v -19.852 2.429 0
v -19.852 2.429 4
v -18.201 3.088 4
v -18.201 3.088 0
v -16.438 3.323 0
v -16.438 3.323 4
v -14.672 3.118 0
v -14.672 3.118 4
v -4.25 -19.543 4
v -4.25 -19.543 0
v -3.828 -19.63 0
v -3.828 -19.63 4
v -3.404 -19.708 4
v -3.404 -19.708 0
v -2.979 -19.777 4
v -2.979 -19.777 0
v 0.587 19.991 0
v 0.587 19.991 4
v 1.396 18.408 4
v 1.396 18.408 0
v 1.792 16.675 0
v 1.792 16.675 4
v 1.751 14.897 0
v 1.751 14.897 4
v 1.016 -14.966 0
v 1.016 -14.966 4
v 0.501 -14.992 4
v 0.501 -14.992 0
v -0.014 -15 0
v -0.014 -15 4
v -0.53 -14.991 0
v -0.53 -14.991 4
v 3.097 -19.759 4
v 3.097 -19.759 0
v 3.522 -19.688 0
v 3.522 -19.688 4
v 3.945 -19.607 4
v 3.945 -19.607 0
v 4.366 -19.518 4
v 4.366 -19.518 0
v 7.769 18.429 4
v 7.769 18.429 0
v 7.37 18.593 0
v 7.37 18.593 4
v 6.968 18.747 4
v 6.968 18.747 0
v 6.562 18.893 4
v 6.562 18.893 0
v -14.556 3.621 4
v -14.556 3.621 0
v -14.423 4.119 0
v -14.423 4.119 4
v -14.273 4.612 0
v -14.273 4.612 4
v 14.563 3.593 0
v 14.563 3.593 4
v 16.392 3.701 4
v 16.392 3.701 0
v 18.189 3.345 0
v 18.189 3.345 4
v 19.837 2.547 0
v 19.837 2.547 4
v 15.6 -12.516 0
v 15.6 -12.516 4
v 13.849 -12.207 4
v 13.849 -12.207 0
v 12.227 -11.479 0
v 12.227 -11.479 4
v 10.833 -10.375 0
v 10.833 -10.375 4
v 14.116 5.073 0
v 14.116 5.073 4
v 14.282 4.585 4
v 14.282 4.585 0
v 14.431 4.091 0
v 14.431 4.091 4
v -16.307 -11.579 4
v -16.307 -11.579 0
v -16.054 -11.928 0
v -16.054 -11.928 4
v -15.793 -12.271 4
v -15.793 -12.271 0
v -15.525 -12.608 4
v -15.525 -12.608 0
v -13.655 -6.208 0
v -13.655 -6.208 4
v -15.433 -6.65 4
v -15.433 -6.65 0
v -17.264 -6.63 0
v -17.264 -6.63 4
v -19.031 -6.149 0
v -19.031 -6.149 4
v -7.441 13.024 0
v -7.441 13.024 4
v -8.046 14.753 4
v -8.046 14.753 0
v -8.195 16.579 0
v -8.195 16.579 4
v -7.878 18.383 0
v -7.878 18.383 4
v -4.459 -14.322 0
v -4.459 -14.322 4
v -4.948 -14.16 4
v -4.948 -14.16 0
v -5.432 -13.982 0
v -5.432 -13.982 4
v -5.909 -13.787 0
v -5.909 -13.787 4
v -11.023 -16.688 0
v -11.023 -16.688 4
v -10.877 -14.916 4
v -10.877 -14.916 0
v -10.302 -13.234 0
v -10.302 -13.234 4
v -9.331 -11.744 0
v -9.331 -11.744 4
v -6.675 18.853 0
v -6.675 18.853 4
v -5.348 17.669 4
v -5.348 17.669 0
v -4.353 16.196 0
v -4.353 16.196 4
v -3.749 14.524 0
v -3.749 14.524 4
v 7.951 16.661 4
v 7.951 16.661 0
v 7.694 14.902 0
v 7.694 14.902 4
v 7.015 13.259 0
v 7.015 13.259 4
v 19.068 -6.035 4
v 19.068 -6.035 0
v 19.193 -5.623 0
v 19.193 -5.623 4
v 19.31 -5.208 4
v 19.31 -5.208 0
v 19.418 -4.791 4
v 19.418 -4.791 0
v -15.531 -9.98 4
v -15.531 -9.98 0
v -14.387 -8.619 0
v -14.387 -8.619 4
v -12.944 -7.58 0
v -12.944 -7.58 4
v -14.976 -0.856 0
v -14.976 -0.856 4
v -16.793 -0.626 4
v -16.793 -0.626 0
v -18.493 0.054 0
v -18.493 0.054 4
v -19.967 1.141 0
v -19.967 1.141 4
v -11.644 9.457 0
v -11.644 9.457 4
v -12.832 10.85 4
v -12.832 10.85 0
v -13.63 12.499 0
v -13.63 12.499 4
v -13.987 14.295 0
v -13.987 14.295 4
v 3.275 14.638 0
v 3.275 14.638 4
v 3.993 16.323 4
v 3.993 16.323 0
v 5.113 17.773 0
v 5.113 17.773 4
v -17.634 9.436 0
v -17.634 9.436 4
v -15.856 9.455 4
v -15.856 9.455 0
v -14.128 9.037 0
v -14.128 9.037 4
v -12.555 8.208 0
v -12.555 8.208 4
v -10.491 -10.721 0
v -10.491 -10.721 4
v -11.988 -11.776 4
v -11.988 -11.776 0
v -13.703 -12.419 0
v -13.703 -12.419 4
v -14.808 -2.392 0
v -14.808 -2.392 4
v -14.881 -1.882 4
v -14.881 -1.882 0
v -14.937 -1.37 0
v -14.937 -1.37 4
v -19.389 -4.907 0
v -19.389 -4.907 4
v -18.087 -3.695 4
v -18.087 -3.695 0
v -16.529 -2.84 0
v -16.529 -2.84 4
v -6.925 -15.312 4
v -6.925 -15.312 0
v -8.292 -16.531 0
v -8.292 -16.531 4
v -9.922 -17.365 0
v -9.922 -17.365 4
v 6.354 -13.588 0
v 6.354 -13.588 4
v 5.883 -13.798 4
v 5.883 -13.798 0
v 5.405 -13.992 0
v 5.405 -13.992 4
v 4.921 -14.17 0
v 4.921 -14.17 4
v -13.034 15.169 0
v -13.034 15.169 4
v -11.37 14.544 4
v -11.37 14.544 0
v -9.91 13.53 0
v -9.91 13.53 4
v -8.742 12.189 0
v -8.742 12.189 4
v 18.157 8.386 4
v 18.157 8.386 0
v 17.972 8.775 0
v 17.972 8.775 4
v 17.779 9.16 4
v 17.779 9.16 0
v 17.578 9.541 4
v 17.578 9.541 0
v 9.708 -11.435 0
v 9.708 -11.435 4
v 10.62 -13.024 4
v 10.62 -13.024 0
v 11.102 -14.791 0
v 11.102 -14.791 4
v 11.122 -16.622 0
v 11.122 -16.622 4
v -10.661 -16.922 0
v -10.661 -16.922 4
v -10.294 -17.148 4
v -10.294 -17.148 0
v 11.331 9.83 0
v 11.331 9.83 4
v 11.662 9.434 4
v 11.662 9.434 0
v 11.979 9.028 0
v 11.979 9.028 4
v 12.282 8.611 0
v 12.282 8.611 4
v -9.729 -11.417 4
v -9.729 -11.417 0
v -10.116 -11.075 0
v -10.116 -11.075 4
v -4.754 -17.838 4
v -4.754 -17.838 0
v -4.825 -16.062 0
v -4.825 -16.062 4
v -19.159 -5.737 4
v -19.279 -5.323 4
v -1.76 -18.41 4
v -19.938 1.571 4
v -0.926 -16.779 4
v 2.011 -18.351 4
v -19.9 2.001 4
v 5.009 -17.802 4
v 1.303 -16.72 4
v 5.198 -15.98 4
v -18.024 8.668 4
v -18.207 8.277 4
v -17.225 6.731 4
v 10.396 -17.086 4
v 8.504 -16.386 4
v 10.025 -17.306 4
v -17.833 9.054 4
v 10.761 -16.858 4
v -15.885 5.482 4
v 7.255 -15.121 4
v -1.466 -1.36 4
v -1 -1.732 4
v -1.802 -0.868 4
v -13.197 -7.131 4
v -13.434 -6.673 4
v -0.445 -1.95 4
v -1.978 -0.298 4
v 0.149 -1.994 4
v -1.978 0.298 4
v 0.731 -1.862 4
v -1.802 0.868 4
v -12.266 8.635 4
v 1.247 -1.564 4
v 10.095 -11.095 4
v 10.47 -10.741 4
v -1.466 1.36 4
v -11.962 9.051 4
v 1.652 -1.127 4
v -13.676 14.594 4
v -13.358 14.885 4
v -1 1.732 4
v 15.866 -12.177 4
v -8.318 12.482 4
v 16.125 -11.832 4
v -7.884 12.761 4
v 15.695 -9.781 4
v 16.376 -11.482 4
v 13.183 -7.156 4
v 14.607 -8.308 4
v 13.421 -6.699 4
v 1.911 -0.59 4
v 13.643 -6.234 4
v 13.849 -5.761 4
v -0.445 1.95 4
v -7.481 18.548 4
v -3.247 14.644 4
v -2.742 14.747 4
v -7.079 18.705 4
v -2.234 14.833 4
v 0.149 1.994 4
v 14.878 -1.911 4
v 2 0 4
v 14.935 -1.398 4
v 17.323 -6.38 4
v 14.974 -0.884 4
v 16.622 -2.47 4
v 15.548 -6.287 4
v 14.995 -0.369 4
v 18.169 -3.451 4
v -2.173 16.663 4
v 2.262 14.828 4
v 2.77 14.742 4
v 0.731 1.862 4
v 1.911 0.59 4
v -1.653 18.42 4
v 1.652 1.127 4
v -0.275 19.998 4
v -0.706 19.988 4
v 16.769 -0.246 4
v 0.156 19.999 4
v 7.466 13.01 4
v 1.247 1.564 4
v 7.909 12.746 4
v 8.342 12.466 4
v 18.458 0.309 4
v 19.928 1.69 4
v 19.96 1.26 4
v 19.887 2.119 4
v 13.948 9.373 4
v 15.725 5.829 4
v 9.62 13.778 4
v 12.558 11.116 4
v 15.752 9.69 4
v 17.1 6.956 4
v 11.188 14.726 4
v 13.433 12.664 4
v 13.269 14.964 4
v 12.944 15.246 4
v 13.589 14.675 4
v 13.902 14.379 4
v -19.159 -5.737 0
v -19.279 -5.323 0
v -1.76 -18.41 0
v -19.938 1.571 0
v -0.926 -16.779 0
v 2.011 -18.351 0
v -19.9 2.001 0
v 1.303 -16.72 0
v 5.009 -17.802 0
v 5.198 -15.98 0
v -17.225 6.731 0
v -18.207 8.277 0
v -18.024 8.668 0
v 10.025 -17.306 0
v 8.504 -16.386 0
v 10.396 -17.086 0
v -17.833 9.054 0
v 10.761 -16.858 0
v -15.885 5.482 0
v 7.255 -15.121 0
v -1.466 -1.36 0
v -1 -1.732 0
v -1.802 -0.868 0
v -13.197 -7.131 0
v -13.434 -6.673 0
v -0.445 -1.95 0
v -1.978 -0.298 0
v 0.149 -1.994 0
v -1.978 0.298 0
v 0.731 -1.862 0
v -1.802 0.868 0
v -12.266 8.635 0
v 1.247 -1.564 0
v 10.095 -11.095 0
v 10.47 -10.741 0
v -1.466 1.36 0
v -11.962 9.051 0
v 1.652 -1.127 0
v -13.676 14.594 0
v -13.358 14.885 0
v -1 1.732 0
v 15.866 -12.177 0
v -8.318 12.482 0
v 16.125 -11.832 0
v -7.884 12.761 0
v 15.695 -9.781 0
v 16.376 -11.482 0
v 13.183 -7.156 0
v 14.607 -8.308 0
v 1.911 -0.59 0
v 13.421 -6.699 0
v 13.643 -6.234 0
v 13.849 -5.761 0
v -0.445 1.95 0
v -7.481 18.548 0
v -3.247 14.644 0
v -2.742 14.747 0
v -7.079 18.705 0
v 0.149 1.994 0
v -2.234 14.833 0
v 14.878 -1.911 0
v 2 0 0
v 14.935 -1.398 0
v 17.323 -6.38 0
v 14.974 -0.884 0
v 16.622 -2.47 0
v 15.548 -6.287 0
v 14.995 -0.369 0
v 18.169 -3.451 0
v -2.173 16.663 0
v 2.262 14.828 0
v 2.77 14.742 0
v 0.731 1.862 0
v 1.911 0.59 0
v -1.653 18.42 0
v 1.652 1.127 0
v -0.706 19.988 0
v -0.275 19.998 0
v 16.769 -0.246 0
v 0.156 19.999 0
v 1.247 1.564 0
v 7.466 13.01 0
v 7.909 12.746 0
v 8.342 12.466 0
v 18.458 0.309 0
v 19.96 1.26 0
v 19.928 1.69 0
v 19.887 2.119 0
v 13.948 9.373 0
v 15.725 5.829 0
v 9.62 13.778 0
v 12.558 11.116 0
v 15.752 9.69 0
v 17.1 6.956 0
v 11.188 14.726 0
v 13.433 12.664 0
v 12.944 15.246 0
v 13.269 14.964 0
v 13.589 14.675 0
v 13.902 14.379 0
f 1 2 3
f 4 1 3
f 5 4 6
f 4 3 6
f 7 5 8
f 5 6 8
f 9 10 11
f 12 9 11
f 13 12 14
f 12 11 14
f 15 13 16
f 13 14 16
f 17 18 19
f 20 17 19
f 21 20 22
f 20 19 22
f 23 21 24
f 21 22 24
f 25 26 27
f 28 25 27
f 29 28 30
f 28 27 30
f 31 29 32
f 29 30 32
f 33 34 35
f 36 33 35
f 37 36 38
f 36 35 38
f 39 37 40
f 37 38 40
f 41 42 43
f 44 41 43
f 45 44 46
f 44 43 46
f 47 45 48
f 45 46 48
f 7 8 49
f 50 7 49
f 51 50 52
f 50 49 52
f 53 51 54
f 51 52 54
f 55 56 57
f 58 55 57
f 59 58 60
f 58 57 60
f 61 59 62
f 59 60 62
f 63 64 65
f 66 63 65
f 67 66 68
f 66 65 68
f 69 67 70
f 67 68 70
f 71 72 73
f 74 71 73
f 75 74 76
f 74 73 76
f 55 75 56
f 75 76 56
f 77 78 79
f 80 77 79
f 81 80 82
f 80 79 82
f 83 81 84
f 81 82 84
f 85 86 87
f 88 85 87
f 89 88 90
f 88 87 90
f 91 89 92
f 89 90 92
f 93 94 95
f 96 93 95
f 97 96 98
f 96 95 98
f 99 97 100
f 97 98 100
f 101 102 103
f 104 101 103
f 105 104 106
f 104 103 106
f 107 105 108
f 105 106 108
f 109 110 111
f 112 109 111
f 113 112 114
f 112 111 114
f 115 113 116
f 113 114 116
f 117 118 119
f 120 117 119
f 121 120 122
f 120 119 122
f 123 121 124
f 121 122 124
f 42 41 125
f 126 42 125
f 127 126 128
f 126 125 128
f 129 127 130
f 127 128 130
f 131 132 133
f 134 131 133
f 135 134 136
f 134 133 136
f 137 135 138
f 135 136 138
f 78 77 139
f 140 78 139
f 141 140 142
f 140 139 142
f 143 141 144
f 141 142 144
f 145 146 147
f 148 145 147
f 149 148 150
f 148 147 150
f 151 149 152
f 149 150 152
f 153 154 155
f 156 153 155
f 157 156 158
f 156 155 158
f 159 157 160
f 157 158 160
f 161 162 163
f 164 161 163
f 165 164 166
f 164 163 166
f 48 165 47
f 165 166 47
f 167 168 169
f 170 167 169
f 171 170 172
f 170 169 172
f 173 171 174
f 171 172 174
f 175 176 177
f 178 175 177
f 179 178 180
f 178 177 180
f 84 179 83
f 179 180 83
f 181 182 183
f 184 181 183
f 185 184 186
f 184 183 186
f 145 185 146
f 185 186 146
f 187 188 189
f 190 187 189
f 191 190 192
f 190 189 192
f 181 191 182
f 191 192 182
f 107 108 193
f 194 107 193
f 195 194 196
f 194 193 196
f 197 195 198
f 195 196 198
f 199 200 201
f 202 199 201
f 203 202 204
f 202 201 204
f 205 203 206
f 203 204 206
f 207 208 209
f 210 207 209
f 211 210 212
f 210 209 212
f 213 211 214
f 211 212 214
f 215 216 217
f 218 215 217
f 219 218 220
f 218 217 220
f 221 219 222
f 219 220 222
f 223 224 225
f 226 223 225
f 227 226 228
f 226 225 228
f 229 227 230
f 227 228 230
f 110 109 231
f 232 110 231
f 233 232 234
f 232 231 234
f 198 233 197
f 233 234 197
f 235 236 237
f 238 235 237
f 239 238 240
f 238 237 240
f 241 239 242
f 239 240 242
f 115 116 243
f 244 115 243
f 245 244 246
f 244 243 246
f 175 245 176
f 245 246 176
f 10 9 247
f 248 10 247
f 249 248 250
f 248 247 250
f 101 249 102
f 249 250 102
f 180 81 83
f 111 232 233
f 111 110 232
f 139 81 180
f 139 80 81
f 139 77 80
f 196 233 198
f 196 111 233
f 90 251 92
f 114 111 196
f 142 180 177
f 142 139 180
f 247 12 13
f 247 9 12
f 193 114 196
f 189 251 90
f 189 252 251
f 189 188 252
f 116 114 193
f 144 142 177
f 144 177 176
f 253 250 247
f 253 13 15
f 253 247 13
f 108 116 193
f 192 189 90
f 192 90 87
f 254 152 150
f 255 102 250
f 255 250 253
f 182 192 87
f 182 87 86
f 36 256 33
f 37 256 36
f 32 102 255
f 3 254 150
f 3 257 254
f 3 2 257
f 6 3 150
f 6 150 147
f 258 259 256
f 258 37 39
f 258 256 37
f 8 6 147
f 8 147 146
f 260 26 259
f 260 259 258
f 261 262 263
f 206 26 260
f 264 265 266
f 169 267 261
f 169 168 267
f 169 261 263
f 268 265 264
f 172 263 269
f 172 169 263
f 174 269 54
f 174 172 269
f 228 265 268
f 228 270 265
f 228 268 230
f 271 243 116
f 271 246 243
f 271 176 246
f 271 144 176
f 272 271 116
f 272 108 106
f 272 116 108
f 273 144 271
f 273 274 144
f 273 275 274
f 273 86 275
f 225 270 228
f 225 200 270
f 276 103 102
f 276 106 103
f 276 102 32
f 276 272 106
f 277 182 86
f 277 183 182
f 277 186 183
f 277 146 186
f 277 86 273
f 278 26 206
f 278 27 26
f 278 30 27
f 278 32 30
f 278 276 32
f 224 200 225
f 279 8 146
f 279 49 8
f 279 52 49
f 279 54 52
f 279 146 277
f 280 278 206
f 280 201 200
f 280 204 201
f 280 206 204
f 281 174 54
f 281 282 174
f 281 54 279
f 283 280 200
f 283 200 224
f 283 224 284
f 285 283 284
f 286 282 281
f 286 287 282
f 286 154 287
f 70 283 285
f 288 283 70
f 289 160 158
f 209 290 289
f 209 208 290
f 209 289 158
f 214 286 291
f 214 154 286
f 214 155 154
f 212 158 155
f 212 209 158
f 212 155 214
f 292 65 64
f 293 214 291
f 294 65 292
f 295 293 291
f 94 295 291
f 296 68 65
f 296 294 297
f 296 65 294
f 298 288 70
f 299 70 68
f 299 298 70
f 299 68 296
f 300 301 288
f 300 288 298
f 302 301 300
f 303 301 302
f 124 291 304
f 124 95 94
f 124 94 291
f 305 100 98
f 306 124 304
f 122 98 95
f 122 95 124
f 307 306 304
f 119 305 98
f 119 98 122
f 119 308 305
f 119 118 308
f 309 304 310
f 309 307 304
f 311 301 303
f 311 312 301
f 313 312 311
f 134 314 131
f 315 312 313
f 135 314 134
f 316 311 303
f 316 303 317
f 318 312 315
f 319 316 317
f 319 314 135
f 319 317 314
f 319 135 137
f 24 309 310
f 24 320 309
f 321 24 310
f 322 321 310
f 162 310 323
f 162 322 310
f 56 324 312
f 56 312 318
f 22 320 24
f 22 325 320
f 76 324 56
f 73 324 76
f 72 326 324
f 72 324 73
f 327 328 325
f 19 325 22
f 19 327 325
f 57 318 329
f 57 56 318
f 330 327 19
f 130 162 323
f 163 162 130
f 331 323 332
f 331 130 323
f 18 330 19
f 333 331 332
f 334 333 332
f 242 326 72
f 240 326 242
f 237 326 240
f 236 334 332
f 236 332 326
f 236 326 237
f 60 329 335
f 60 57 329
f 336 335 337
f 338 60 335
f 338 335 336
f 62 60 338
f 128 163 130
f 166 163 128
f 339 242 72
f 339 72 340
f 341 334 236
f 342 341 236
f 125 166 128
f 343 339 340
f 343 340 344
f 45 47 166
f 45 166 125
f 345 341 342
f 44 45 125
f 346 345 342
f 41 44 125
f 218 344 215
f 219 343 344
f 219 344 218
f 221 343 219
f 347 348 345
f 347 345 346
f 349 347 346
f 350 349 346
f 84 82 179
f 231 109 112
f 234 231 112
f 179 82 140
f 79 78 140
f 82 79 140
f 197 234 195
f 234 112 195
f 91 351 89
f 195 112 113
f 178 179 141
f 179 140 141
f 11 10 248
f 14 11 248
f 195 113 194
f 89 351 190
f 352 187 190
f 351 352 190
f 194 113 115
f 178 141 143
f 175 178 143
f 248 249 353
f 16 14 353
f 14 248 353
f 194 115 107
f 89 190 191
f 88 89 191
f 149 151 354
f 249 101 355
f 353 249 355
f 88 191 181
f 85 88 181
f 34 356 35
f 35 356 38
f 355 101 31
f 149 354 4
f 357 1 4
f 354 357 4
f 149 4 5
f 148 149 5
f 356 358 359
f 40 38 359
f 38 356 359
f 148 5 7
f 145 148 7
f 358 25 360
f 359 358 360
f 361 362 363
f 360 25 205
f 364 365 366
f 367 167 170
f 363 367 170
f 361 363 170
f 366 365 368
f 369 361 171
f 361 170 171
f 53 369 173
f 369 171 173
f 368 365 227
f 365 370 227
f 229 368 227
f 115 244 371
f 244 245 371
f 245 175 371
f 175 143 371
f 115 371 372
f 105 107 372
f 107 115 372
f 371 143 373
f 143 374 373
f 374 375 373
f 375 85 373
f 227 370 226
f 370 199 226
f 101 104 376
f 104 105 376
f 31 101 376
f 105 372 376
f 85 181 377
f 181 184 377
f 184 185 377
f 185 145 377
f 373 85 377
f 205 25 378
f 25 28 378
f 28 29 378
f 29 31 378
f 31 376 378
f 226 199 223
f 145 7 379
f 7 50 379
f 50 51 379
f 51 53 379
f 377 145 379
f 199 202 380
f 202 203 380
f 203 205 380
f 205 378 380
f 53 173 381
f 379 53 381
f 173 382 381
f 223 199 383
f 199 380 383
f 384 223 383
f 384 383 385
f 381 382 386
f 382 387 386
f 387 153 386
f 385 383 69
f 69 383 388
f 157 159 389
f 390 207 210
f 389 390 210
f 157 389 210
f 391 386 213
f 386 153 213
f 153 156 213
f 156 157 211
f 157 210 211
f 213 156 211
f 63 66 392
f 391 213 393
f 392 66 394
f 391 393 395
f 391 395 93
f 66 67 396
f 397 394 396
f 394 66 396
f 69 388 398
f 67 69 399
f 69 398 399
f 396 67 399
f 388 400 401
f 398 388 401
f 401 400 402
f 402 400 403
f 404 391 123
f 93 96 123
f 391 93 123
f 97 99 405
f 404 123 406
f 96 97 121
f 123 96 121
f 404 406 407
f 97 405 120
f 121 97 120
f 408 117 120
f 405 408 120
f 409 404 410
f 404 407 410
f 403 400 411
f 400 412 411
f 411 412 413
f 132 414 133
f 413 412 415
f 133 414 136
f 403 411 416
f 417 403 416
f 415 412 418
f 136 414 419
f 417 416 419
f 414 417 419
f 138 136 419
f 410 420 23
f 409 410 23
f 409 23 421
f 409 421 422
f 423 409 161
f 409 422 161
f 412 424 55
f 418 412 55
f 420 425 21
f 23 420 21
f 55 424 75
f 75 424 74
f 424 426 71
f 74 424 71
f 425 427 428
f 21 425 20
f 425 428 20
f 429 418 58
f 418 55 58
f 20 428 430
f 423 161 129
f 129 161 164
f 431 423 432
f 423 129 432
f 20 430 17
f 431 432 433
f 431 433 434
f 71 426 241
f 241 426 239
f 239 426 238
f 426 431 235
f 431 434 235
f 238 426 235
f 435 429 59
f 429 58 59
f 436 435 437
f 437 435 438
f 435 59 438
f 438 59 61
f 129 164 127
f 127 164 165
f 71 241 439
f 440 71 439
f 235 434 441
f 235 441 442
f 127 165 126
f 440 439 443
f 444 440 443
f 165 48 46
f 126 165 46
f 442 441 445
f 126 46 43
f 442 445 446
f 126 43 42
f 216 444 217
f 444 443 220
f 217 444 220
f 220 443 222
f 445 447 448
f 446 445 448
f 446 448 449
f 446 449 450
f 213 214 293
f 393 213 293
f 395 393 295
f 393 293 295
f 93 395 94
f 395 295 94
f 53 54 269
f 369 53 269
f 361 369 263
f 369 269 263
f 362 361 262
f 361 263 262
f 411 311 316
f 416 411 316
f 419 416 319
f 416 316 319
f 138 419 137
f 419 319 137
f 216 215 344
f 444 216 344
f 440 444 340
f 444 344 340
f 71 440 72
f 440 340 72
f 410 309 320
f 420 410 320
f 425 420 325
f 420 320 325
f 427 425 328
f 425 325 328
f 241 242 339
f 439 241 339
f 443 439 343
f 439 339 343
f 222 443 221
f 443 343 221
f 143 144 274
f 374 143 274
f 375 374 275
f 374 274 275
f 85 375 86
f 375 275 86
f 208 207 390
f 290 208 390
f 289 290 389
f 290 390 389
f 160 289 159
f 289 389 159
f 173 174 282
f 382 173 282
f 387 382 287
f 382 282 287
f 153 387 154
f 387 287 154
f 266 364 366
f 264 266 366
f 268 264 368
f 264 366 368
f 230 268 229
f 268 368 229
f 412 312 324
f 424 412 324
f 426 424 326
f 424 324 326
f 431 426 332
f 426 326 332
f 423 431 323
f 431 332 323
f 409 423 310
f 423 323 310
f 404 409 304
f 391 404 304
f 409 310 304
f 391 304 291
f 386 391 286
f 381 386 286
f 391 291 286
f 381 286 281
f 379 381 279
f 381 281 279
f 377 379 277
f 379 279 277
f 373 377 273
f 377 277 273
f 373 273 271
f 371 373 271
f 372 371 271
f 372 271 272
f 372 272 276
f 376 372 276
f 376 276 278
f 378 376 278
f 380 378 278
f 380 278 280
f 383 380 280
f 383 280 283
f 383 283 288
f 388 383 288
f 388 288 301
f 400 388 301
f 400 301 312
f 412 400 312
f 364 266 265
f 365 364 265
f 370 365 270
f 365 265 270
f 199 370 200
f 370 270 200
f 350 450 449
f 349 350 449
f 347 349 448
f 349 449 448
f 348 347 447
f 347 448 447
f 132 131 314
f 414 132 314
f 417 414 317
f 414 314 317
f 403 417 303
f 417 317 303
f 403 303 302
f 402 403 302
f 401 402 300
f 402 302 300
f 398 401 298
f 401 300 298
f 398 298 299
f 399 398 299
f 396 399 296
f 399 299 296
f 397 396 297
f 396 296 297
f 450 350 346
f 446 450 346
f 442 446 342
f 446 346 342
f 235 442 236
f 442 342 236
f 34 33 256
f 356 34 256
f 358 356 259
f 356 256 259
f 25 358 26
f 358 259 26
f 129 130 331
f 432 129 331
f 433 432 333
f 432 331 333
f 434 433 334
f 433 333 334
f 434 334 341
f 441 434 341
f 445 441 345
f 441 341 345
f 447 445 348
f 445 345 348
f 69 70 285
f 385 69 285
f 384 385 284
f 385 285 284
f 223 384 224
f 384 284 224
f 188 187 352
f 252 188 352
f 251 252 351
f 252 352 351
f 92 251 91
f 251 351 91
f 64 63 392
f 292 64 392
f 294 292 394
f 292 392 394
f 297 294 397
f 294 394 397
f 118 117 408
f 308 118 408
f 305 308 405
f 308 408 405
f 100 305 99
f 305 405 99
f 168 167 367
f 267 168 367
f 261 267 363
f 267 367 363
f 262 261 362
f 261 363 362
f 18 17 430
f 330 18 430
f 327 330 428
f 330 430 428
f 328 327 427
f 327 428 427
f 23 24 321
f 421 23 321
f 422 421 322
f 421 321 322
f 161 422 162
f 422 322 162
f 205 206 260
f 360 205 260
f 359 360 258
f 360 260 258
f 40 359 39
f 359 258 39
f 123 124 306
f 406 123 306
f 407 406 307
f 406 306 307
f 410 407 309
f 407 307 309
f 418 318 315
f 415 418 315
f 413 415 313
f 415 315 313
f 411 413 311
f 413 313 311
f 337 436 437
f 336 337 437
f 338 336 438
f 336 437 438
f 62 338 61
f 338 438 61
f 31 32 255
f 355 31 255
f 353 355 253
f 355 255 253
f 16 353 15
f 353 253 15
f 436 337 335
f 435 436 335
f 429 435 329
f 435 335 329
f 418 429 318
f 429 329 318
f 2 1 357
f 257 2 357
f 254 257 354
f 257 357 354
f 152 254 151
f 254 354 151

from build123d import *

# Parameters (mm, degrees)
SKIZZE1_R                       = 20
AUFSATZ_LINEAR_AUSTRAGEN1_DEPTH = 4
SCHNITT_LINEAR_AUSTRAGEN1_REACH = 6
SKIZZE2_R                       = 2
SCHNITT_LINEAR_AUSTRAGEN2_DEPTH = 4
KREISMUSTER1_COUNT              = 17


with BuildPart() as part:
    # Skizze1 → Aufsatz-Linear austragen1 (new body)
    with BuildSketch(Plane.XY):
        Circle(SKIZZE1_R)
    extrude(amount=AUFSATZ_LINEAR_AUSTRAGEN1_DEPTH)

    # Skizze2 → Schnitt-Linear austragen1 (cut, up to next)
    with BuildSketch(Plane.XY.offset(4), mode=Mode.PRIVATE) as schnitt_linear_austragen1_sk1:
        Circle(SKIZZE2_R)
    schnitt_linear_austragen1_tool1 = extrude(schnitt_linear_austragen1_sk1.sketch, amount=-SCHNITT_LINEAR_AUSTRAGEN1_REACH, mode=Mode.PRIVATE) & part.part
    add(schnitt_linear_austragen1_tool1.solids().sort_by_distance((0, 0, 4))[0], mode=Mode.SUBTRACT)

    # Skizze3 → Schnitt-Linear austragen2 (cut)
    with BuildSketch(Plane.XY.offset(4)):
        with BuildLine():
            ThreePointArc((0.586774522, 19.991390538), (1.647430818, 17.553771601), (1.751244892, 14.897420627))
            ThreePointArc((1.751244892, 14.897420627), (2.516627793, 14.787379232), (3.275322949, 14.638041521))
            ThreePointArc((3.275322949, 14.638041521), (4.506718961, 17.083727504), (6.562201755, 18.892789845))
            ThreePointArc((6.562201755, 18.892789845), (3.616448026, 19.670315292), (0.586774522, 19.991390538))
        make_face()
    schnitt_linear_austragen2 = extrude(amount=-SCHNITT_LINEAR_AUSTRAGEN2_DEPTH, mode=Mode.SUBTRACT)

    # Kreismuster1: Schnitt-Linear austragen2 ×17 about axis
    kreismuster1_axis = Axis((0, 0, 0), (0, 0, 1))
    for i in range(1, KREISMUSTER1_COUNT):
        add(schnitt_linear_austragen2.rotate(kreismuster1_axis, i * 360 / KREISMUSTER1_COUNT), mode=Mode.SUBTRACT)


solid = part.part
